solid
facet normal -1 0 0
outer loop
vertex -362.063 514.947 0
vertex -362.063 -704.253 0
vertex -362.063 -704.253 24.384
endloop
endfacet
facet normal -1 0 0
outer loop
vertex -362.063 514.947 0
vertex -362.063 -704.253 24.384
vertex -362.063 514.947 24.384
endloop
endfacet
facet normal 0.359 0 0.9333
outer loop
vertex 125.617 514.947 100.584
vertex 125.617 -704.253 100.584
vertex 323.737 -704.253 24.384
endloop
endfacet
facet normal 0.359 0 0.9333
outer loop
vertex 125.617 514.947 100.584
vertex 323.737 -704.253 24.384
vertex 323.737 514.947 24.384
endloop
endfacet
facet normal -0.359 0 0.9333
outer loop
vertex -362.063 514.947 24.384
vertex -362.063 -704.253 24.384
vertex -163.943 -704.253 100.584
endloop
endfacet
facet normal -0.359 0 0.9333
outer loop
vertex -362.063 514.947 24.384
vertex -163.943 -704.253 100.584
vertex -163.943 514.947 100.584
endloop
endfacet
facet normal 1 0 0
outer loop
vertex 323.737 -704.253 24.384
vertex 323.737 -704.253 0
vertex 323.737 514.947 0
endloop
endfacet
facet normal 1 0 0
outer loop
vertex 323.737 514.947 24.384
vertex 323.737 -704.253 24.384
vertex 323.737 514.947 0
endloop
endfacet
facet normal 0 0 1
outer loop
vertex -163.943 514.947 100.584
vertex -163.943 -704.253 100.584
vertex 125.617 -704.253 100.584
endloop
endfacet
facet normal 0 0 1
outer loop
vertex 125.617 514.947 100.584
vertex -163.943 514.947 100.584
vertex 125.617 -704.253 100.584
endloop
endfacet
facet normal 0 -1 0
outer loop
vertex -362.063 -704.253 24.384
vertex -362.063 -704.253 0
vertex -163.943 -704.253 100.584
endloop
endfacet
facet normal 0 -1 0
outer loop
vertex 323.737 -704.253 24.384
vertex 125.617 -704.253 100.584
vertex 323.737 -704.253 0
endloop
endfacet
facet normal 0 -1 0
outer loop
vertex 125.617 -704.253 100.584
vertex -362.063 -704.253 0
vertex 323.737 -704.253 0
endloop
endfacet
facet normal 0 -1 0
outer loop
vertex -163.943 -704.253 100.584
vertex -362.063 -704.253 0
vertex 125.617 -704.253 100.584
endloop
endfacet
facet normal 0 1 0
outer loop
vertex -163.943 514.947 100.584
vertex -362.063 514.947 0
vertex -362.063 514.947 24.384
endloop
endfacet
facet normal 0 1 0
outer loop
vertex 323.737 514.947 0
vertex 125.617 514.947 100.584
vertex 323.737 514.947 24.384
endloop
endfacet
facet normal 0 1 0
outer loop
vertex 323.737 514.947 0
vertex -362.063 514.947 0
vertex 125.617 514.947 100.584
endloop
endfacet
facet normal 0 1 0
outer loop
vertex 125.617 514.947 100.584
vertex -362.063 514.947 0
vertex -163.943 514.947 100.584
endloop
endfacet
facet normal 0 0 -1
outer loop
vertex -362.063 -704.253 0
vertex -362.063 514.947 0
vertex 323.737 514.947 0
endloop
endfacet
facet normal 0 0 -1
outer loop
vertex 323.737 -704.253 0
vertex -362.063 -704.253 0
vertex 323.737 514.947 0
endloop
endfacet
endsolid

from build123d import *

# Parameters (mm, degrees)
F0_W     = 685.8
F0_H     = 1219.2
F1_DEPTH = 100.584
F2_SIZE2 = 76.2
F2_SIZE  = 198.12
F3_SIZE2 = 198.12
F3_SIZE  = 76.2


with BuildPart() as f1:
    # F0 (on Top) → F1 (new body)
    with BuildSketch(Plane.XY):
        with Locations((-19.1630474292, -94.6527993087)):
            Rectangle(F0_W, F0_H)
    extrude(amount=F1_DEPTH)

    # F2
    f2_edges = [f1.edges().sort_by_distance(p)[0] for p in [
        (-362.063047, -94.652799, 100.584),
    ]]
    f2_side = f1.faces().sort_by_distance((-19.163047, -94.652799, 100.584))[0]
    chamfer(f2_edges, length=F2_SIZE, length2=F2_SIZE2, reference=f2_side)

    # F3
    f3_edges = [f1.edges().sort_by_distance(p)[0] for p in [
        (323.736953, -94.652799, 100.584),
    ]]
    f3_side = f1.faces().sort_by_distance((323.736953, -94.652799, 50.292))[0]
    chamfer(f3_edges, length=F3_SIZE, length2=F3_SIZE2, reference=f3_side)


solid = f1.part
